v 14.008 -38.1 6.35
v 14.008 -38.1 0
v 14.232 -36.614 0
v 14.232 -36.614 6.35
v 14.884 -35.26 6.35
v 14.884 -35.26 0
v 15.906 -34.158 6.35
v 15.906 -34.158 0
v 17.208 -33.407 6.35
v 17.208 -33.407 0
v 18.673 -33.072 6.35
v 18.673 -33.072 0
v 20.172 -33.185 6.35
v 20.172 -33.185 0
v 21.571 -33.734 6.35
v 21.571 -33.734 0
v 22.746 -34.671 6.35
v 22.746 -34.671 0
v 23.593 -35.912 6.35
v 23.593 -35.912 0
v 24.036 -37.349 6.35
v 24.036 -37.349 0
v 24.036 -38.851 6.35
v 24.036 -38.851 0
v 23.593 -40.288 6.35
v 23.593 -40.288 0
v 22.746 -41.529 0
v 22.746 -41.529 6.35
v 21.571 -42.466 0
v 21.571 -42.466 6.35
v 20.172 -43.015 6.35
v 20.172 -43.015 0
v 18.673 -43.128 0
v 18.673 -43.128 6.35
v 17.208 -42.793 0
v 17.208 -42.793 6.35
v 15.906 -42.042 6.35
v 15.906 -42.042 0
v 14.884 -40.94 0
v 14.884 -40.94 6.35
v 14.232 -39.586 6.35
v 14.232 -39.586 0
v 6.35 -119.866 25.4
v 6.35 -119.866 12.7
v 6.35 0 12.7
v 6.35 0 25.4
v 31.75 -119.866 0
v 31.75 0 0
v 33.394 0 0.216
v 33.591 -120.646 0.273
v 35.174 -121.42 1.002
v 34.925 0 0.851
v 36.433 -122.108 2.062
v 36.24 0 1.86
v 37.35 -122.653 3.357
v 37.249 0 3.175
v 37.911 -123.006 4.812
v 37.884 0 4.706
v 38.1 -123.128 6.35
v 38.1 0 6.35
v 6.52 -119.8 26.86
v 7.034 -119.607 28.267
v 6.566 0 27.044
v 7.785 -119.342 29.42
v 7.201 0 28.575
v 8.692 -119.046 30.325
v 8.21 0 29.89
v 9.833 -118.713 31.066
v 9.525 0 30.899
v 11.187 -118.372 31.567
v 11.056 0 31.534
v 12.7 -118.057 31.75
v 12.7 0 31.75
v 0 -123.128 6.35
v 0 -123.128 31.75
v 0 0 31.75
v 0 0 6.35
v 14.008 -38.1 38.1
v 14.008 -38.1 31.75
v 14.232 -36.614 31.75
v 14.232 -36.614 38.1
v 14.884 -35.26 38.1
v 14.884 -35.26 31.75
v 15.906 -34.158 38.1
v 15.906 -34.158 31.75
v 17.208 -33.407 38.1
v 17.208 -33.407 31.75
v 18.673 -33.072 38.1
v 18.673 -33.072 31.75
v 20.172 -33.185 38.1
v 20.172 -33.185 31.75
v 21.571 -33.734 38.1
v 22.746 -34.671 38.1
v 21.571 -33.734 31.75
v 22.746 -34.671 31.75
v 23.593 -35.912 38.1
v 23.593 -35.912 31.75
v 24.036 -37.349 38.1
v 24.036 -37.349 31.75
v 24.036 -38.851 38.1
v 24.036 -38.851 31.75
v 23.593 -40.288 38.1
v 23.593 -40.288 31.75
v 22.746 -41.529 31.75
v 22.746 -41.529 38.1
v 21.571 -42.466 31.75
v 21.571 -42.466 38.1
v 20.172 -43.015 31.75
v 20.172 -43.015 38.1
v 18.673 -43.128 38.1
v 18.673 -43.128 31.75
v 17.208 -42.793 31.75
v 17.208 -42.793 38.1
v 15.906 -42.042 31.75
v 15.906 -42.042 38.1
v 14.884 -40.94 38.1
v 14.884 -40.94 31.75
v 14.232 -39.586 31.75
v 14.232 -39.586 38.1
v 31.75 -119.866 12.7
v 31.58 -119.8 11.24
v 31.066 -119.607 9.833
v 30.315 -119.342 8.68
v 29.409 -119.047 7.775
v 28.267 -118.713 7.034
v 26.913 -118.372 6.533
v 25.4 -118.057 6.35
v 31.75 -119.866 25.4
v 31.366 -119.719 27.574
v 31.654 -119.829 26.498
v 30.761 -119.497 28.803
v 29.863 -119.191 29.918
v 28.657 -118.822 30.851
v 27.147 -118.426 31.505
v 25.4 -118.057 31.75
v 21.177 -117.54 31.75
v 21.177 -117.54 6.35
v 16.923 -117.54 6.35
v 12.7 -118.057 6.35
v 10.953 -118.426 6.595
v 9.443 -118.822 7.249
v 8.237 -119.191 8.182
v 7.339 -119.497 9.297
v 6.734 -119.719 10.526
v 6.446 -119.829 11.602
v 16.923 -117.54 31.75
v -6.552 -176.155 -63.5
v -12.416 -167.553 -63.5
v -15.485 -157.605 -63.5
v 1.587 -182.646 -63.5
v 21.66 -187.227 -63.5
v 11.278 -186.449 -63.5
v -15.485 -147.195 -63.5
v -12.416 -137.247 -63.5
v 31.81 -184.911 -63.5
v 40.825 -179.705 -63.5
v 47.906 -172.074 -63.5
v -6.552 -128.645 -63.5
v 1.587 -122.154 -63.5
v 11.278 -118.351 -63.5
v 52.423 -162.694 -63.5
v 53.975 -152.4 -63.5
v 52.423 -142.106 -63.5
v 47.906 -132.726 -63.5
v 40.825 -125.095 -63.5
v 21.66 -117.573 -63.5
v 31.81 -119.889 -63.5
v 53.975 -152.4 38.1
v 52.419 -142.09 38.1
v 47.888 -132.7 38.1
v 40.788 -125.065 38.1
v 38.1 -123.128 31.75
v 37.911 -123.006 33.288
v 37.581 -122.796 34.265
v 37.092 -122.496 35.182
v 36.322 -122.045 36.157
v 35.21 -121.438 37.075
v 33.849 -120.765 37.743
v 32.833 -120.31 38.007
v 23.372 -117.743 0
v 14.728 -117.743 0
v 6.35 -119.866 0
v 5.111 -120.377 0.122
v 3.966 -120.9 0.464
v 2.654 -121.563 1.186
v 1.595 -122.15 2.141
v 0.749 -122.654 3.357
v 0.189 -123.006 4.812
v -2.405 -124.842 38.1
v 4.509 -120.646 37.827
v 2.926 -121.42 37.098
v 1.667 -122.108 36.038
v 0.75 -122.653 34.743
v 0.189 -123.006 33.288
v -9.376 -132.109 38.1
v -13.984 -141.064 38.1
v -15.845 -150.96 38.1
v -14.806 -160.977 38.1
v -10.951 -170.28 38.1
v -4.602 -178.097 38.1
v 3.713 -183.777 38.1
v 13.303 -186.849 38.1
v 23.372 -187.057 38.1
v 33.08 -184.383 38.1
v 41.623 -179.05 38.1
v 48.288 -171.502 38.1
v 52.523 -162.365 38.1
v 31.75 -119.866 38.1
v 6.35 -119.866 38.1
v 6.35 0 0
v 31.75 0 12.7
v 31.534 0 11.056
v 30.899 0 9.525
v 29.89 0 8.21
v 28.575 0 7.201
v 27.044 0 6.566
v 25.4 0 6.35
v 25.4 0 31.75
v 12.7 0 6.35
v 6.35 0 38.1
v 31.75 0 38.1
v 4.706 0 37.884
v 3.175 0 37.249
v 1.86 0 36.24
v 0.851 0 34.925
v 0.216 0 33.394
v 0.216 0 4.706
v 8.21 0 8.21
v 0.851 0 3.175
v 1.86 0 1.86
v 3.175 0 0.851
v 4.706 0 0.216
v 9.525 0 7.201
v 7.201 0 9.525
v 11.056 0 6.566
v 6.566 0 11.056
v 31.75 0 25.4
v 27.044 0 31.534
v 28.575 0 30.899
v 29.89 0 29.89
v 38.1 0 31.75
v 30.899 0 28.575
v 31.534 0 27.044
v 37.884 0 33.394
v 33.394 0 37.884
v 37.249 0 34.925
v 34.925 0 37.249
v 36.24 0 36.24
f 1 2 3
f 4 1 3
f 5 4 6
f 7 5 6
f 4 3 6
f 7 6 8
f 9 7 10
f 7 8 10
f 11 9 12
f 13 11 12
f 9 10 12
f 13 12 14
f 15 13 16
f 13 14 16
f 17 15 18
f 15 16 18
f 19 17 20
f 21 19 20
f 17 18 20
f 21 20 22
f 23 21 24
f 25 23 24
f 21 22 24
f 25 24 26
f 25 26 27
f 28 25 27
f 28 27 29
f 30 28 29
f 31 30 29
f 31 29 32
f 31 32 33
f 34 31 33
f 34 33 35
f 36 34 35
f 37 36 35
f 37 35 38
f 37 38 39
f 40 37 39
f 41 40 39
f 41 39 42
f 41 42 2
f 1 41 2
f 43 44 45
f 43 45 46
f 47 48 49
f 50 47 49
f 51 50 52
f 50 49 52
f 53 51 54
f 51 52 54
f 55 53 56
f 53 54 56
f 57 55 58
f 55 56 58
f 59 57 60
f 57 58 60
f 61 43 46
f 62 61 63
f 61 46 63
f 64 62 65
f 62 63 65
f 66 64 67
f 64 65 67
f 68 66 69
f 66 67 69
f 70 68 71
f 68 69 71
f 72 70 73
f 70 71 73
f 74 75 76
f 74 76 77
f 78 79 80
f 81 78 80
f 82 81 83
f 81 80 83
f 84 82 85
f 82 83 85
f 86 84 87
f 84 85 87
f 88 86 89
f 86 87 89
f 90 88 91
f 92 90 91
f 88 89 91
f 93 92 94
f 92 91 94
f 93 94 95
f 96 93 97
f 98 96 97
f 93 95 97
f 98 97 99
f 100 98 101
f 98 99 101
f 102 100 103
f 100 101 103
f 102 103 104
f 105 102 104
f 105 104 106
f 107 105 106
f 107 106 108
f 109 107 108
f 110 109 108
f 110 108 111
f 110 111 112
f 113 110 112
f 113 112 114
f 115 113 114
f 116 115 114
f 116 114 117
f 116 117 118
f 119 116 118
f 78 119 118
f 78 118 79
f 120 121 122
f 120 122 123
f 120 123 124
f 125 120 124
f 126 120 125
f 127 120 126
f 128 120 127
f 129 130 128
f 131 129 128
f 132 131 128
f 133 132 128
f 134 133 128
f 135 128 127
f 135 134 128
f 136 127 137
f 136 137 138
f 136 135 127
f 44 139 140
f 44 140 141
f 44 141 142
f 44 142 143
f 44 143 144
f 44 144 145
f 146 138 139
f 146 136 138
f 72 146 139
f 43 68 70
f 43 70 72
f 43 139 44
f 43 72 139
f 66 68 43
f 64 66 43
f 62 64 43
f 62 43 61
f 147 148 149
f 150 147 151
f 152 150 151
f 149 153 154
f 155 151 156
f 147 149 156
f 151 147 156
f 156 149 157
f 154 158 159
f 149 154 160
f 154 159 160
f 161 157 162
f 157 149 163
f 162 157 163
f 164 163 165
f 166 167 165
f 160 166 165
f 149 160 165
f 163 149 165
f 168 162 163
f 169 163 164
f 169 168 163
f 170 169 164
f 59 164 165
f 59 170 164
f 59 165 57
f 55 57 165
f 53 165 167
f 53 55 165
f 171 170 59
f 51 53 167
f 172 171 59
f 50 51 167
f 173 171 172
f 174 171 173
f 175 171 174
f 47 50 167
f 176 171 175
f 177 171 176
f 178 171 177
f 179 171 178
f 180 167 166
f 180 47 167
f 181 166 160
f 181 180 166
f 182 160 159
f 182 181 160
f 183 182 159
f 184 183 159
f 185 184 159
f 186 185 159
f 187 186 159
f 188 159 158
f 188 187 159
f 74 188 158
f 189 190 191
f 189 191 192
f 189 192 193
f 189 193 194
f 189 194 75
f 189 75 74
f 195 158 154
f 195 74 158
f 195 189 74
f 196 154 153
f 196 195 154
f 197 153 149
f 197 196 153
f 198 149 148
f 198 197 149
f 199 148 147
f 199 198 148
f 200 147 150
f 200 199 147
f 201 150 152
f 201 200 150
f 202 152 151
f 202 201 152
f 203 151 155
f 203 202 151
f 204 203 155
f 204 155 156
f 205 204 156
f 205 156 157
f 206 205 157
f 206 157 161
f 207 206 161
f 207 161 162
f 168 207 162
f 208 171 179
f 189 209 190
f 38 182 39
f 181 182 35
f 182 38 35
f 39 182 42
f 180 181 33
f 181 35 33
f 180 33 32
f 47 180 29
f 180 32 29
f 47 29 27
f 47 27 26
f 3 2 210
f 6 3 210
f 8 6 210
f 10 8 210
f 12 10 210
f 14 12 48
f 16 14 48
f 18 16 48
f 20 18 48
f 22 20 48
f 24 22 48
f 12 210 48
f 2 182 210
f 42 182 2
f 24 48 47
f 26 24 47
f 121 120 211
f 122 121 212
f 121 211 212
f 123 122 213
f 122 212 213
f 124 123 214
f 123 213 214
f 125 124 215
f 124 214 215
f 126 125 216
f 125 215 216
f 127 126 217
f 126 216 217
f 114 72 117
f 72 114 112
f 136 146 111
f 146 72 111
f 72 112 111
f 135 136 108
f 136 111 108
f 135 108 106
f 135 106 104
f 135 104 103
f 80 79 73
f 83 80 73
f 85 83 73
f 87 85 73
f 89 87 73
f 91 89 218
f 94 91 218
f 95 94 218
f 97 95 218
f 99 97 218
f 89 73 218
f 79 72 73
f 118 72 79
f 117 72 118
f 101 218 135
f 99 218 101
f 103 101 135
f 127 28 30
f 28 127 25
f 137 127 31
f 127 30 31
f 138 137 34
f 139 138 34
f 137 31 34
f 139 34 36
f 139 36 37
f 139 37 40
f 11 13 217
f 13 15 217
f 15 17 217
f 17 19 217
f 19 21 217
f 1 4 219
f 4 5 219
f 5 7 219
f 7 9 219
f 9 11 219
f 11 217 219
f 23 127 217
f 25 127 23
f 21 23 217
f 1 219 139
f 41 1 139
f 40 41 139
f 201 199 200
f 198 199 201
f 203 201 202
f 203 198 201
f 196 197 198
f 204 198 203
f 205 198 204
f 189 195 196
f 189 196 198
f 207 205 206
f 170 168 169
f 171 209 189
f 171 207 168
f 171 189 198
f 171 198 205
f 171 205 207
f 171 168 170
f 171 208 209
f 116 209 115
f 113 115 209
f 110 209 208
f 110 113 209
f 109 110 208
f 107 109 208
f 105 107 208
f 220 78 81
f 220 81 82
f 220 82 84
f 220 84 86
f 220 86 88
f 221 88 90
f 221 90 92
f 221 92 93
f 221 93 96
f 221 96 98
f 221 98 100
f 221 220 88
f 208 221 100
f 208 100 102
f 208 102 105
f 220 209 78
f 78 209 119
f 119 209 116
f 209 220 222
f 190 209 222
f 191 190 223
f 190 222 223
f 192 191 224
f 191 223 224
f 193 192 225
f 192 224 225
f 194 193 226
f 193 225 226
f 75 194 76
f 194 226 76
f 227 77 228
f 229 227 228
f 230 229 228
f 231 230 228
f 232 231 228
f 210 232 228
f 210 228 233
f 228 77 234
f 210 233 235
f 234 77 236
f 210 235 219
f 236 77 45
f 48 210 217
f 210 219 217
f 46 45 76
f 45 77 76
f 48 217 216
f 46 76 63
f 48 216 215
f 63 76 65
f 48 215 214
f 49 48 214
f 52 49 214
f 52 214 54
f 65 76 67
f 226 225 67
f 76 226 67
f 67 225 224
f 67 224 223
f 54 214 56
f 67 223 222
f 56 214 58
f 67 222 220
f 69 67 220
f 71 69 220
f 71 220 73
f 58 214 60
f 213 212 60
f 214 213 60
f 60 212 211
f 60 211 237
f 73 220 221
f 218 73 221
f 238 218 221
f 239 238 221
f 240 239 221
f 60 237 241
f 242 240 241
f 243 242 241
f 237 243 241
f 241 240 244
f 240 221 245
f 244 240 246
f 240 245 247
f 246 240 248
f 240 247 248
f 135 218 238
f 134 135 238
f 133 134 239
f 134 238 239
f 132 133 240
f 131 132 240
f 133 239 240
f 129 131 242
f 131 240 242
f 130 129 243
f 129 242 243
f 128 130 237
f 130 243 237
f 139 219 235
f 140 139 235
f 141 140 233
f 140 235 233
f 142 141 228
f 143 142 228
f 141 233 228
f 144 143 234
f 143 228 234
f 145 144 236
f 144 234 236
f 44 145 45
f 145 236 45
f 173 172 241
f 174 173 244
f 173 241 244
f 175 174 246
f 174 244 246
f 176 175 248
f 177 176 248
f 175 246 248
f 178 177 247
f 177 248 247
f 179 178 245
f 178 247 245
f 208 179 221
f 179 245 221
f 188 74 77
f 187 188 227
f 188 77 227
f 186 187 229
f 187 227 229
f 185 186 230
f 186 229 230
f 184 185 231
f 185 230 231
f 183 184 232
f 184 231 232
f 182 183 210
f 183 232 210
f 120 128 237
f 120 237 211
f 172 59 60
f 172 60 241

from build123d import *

# Parameters (mm, degrees)
F1_DEPTH = 152.4
F2_R     = 34.925
F3_DEPTH = 101.6
F5_D     = 10.0838


with BuildPart() as f1:
    # F0 (on Front) → F1 (new body)
    with BuildSketch(Plane.XZ):
        with BuildLine():
            ThreePointArc((0, 6.35), (1.8598719395, 1.8598719395), (6.35, 0))
            Line((6.35, 0), (31.75, 0))
            ThreePointArc((31.75, 0), (36.2401280605, 1.8598719395), (38.1, 6.35))
            Line((38.1, 6.35), (38.1, 31.75))
            ThreePointArc((38.1, 31.75), (36.2401280605, 36.2401280605), (31.75, 38.1))
            Line((31.75, 38.1), (6.35, 38.1))
            ThreePointArc((6.35, 38.1), (1.8598719395, 36.2401280605), (0, 31.75))
            Line((0, 31.75), (0, 6.35))
        make_face()
        with BuildLine():
            Line((25.4, 6.35), (12.7, 6.35))
            ThreePointArc((12.7, 6.35), (8.2098719395, 8.2098719395), (6.35, 12.7))
            Line((6.35, 12.7), (6.35, 25.4))
            ThreePointArc((6.35, 25.4), (8.2098719395, 29.8901280605), (12.7, 31.75))
            Line((12.7, 31.75), (25.4, 31.75))
            ThreePointArc((25.4, 31.75), (29.8901280605, 29.8901280605), (31.75, 25.4))
            Line((31.75, 25.4), (31.75, 12.7))
            ThreePointArc((31.75, 12.7), (29.8901280605, 8.2098719395), (25.4, 6.35))
        make_face(mode=Mode.SUBTRACT)
    extrude(amount=F1_DEPTH)

    # F2 (on face) → F3 (join)
    with BuildSketch(Plane.XY.offset(38.1)):
        with Locations((19.05, -152.4)):
            Circle(F2_R)
    extrude(amount=-F3_DEPTH)

    # F5 (through all)
    with Locations(Plane.XY.offset(38.1)):
        with Locations((19.05, -38.1)):
            Hole(F5_D / 2)


solid = f1.part
